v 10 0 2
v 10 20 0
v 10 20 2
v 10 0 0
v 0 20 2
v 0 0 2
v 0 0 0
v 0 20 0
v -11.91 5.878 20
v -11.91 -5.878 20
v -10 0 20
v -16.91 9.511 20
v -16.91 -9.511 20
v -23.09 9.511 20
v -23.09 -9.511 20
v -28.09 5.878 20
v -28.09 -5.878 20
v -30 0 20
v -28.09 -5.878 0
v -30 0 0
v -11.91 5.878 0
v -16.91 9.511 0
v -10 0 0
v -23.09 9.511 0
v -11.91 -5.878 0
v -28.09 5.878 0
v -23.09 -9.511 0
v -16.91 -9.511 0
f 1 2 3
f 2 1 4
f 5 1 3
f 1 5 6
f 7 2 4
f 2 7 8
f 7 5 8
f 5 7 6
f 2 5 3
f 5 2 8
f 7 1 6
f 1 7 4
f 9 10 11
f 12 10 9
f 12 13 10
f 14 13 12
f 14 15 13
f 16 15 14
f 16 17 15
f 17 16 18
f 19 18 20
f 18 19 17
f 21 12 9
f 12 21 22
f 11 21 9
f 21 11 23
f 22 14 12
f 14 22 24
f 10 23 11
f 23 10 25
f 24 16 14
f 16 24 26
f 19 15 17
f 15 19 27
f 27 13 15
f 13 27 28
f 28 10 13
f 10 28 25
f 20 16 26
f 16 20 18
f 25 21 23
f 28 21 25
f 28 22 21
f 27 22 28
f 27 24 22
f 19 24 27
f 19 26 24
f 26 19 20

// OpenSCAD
cube([10,20,2]);
translate([-20,0])
cylinder(r=10,20,$fn=10);
